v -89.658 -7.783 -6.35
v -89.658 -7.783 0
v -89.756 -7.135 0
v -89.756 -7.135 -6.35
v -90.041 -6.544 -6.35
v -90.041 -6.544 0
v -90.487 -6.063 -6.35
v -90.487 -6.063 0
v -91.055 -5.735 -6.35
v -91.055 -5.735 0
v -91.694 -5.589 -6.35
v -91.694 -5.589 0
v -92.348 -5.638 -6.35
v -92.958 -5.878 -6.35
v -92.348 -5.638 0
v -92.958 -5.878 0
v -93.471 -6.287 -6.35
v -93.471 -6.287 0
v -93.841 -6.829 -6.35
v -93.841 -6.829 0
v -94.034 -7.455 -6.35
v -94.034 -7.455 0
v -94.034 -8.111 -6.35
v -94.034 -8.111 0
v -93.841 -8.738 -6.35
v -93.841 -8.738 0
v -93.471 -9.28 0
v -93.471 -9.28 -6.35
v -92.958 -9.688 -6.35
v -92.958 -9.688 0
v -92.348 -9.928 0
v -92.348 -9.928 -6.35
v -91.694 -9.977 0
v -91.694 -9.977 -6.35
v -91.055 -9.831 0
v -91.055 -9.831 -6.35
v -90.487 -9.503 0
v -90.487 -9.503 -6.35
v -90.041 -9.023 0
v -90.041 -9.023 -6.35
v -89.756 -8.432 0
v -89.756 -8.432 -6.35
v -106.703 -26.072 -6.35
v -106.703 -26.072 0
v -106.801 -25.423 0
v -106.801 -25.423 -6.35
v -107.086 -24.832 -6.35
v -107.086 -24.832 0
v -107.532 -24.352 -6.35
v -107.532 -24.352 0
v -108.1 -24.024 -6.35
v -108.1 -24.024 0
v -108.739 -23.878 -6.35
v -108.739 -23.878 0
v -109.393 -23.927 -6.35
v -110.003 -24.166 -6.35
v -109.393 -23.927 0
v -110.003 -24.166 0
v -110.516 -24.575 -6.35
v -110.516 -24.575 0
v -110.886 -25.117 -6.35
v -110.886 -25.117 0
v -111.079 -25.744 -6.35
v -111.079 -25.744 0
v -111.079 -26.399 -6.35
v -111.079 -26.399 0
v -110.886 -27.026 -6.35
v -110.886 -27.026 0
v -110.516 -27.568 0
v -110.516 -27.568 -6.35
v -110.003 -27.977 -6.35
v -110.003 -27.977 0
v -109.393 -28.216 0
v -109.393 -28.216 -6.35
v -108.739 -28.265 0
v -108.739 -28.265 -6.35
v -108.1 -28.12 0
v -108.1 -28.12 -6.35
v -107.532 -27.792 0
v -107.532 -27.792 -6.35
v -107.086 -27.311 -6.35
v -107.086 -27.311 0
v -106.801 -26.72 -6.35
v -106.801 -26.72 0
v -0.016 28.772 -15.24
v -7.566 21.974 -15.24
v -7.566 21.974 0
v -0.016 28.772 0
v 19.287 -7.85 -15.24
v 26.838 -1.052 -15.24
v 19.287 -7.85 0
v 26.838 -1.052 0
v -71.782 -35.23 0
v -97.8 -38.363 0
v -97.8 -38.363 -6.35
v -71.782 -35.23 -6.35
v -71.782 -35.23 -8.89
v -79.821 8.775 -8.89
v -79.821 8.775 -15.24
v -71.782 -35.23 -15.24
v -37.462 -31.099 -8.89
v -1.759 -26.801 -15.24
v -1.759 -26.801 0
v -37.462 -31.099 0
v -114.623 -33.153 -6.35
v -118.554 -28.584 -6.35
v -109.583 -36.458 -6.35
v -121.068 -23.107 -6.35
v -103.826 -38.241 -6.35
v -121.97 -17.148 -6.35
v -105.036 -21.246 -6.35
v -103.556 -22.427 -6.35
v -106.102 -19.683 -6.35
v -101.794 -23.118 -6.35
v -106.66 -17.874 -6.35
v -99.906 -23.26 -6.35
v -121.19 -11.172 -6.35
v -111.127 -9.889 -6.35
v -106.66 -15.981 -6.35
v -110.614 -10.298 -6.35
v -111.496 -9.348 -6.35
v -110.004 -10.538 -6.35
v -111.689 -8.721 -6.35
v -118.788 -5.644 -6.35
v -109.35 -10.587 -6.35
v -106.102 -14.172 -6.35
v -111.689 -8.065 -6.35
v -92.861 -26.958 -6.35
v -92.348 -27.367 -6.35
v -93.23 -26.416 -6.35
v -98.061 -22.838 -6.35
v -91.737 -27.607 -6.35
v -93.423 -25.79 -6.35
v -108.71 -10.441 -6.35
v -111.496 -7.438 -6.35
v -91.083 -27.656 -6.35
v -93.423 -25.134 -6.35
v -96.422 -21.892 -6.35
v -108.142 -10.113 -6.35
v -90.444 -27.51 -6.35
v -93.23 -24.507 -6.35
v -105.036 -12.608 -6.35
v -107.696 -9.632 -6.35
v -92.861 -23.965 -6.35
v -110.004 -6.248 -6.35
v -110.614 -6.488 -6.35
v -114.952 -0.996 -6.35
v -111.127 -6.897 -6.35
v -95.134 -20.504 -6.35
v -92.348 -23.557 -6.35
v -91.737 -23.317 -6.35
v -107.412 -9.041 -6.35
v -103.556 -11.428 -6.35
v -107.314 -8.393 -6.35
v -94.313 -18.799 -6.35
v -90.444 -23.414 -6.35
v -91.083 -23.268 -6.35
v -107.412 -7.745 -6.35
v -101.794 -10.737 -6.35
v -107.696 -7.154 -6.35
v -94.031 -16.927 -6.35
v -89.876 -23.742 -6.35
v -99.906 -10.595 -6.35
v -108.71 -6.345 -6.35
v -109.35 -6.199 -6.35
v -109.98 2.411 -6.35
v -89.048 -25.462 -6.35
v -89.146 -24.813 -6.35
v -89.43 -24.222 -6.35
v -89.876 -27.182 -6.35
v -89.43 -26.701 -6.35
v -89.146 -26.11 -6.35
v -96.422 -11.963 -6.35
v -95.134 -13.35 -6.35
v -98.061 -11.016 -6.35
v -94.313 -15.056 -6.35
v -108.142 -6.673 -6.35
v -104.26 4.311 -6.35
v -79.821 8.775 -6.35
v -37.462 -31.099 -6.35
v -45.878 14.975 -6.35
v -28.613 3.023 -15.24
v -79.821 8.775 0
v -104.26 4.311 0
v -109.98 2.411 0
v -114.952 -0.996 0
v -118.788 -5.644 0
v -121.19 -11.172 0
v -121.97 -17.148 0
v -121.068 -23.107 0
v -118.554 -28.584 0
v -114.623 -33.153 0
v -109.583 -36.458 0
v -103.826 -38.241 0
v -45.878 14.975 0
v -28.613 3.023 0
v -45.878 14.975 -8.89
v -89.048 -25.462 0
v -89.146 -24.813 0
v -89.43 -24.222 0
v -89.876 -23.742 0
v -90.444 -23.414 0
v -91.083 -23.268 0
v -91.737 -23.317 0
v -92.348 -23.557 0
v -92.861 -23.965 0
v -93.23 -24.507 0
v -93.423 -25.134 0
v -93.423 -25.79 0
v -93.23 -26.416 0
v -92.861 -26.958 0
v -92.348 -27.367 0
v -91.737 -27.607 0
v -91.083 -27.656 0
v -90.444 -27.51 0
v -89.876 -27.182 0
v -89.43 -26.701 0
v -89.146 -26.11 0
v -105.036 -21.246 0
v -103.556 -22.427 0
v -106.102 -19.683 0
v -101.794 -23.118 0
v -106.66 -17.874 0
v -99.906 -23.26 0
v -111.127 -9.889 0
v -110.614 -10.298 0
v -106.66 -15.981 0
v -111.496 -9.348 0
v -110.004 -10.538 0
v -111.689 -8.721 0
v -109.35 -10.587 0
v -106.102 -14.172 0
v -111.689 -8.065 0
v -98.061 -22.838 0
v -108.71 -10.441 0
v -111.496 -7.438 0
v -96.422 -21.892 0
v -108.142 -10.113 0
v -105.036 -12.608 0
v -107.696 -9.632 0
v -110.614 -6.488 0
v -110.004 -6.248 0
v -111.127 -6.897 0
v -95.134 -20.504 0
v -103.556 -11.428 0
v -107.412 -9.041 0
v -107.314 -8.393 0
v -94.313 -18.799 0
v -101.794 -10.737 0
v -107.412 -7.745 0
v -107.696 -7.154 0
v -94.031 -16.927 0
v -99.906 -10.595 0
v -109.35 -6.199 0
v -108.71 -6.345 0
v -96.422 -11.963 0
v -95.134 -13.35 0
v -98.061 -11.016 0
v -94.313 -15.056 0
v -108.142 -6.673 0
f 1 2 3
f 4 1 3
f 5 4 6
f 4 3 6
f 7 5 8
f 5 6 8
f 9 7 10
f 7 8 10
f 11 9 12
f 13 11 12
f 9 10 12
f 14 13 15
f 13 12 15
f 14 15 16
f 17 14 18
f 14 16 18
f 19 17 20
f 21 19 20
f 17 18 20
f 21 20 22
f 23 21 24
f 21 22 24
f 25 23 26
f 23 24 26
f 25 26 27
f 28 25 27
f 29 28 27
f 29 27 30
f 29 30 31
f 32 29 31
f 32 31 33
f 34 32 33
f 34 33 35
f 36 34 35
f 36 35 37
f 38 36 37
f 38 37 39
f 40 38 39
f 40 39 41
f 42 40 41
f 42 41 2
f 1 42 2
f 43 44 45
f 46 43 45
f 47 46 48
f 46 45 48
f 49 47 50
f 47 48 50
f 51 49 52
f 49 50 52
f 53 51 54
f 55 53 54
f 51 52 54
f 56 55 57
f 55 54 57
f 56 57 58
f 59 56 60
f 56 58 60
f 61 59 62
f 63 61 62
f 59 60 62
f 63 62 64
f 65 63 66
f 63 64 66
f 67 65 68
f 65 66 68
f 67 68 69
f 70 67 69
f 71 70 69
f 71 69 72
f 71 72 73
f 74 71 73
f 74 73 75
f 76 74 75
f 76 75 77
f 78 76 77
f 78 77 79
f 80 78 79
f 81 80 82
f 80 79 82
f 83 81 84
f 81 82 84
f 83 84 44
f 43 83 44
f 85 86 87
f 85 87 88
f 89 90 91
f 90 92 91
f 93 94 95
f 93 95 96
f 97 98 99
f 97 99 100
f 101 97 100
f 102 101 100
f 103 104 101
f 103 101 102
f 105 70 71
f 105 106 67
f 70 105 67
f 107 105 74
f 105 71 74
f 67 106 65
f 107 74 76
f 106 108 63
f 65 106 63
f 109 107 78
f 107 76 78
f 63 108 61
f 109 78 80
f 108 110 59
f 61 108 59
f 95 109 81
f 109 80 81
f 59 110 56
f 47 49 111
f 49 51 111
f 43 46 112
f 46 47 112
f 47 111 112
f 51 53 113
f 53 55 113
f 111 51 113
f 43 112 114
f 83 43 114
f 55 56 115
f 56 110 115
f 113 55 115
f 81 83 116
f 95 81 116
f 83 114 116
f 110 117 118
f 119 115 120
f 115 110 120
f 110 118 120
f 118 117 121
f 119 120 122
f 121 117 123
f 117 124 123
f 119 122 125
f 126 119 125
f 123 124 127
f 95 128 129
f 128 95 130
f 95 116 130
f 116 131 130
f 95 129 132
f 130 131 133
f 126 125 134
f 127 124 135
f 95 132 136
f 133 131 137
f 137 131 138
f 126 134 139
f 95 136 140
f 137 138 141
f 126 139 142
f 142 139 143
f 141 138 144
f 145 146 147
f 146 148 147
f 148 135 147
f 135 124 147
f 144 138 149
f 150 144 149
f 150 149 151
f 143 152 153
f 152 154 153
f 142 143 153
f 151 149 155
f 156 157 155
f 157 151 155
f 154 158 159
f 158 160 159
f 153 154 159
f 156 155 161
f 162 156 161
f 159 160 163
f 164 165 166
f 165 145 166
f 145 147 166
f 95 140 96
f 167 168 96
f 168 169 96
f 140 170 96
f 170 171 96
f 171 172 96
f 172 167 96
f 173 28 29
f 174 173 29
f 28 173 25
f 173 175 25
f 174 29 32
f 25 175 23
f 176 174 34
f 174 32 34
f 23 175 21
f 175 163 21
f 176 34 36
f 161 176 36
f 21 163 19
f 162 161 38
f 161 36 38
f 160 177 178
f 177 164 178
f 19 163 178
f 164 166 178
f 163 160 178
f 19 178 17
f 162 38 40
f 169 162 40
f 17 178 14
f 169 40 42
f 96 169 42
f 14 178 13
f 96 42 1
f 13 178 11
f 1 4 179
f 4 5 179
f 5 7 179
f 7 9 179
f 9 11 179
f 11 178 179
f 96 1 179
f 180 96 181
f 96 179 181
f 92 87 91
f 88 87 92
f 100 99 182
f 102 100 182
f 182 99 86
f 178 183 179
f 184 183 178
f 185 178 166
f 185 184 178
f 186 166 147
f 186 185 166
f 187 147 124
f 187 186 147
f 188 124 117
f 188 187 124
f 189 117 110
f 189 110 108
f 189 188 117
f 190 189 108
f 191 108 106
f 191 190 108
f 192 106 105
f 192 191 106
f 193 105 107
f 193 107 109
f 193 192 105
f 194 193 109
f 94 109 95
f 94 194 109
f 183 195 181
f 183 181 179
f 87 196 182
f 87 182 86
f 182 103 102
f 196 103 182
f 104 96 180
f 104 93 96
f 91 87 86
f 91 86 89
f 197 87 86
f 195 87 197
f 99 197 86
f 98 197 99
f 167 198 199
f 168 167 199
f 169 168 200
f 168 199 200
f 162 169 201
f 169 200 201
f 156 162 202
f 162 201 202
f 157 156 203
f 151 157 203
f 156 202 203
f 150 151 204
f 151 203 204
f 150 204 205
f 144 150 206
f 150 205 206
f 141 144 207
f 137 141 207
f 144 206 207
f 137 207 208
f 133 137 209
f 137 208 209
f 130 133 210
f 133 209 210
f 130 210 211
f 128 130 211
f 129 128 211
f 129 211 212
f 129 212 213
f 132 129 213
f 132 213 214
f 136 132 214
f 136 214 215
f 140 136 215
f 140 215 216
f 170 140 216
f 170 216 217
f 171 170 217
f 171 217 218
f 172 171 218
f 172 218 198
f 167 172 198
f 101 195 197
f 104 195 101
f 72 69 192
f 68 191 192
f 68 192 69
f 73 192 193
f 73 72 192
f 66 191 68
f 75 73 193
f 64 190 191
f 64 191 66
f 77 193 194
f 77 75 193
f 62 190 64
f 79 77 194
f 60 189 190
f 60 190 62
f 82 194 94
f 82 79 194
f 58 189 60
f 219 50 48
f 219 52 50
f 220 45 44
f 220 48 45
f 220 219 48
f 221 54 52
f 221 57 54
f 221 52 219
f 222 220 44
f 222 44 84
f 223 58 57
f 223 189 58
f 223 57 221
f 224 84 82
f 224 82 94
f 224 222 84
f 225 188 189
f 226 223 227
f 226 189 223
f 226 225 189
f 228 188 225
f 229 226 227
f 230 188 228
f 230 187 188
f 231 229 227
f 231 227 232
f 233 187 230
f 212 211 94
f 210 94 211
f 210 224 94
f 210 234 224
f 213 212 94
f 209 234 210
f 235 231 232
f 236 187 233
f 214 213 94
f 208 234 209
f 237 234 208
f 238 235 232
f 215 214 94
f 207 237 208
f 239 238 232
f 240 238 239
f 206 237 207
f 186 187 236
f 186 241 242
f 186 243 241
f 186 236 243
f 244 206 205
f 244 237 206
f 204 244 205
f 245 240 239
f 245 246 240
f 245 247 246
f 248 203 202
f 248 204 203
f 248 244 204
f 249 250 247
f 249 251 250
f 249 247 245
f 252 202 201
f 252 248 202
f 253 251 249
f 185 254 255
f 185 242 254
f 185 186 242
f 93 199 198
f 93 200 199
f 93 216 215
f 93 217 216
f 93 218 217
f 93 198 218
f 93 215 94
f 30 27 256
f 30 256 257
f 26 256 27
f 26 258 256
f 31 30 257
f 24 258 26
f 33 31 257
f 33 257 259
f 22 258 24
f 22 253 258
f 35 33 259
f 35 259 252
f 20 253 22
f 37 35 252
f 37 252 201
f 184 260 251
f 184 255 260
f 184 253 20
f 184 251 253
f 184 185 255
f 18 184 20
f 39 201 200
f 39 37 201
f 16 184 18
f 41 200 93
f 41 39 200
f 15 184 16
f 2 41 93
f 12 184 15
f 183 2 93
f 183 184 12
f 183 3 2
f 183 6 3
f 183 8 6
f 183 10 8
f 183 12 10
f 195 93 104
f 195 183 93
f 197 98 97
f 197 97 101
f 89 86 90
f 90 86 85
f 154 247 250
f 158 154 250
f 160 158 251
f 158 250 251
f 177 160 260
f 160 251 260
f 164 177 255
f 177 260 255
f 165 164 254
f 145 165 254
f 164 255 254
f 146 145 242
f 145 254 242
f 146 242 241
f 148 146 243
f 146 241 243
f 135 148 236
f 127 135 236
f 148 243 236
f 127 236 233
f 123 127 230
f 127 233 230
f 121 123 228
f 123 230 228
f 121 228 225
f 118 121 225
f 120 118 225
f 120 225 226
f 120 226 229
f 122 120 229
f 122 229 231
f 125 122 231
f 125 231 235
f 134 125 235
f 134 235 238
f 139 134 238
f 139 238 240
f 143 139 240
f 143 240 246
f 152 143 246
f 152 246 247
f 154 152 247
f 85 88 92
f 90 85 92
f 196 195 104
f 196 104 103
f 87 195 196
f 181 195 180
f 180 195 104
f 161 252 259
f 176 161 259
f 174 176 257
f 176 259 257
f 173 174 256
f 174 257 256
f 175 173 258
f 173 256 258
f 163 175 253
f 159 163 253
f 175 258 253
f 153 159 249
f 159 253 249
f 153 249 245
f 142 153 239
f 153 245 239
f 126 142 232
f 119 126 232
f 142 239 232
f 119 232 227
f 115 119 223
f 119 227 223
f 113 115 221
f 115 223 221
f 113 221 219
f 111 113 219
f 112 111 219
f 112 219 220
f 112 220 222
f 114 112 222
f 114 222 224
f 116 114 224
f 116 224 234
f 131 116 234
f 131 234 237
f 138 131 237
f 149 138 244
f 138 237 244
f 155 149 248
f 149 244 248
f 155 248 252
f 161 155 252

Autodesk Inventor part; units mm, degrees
ref_plane "Back Plane" through (0, 0, -12.7) normal (0, 0, -1) x (-1, 0, 0)
ref_plane "Midplane" through (0, 0, -6.35) normal (0, 0, 1) x (1, 0, 0)
ref_plane "YZ Plane" through (0, 0, 0) normal (1, 0, 0) x (0, 1, 0)
sketch "the Axle" plane through (0, 0, 0) normal (0, 0, 1) x (1, 0, 0)
  line L0 (-30.4731, 63.7704) -> (-43.9693, 51.6183)
  line L1 (-43.9693, 51.6183) -> (-54.1341, 62.9075)
  line L2 (-40.6378, 75.0595) -> (-30.4731, 63.7704)
  line L3 (-30.4731, 63.7704) -> (-12.3121, 63.7704) construction
  arc A0 (-40.6378, 75.0595) -> (-54.1341, 62.9075) centre (-42.9621, 64.0703) ccw
  line L4 (-54.1341, 62.9075) -> (-40.6378, 75.0595) construction
  point P0 (-12.6671, 65.6222)
  dimension "d84" = 18.161
  dimension "d85" = 138
  dimension "d231" = 19.812
sketch "Motor Mount Pattern" plane through (0, 0, 0) normal (0, 0, 1) x (1, 0, 0)
  line L0 (-116.3697, 51.2894) -> (-116.3697, 68.9671) construction
  line L1 (-116.3697, 68.9671) -> (-134.0474, 68.9671) construction
  line L2 (-134.0474, 68.9671) -> (-134.0474, 51.2894) construction
  line L3 (-134.0474, 51.2894) -> (-116.3697, 68.9671) construction
  line L4 (-116.3697, 51.2894) -> (-134.0474, 68.9671) construction
  line L5 (-134.0474, 51.2894) -> (-134.0474, 68.9671) construction
  line L6 (-134.0474, 51.2894) -> (-116.3697, 68.9671) construction
  line L7 (-134.0474, 51.2894) -> (-125.2086, 60.1282) construction
  line L8 (-116.3697, 51.2894) -> (-134.0474, 51.2894) construction
  circle A0 centre (-125.2086, 60.1282) radius 6.2
  circle A1 centre (-116.3697, 68.9671) radius 2.25
  circle A2 centre (-134.0474, 68.9671) radius 2.25
  circle A3 centre (-116.3697, 51.2894) radius 2.25
  circle A4 centre (-134.0474, 51.2894) radius 2.25
  circle A5 centre (-116.3697, 68.9671) radius 4.5 construction
  circle A6 centre (-134.0474, 68.9671) radius 4.5 construction
  circle A7 centre (-134.0474, 51.2894) radius 4.5 construction
  circle A8 centre (-116.3697, 51.2894) radius 4.5 construction
  point P0 (-121.7102, 57.8126)
  dimension "d189" = 25
  dimension "d192" = 12.4
  dimension "d193" = 4.5
  dimension "d195" = 9
sketch "Motor Body Extent" plane through (0, 0, 0) normal (0, 0, 1) x (1, 0, 0)
  circle A0 centre (-176.4641, 62.233) radius 24.5 construction
  dimension "MotorDia" = 49
sketch "Block7" plane through (0, 0, 0) normal (0, 0, 1) x (1, 0, 0)
  line L0 (-114.6206, 39.8537) -> (-104.0422, 54.0169) construction
  line L1 (-104.0422, 54.0169) -> (-118.2054, 64.5953) construction
  line L2 (-118.2054, 64.5953) -> (-128.7838, 50.432) construction
  line L3 (-128.7838, 50.432) -> (-104.0422, 54.0169) construction
  line L4 (-114.6206, 39.8537) -> (-118.2054, 64.5953) construction
  line L5 (-128.7838, 50.432) -> (-118.2054, 64.5953) construction
  line L6 (-128.7838, 50.432) -> (-104.0422, 54.0169) construction
  line L7 (-128.7838, 50.432) -> (-116.413, 52.2245) construction
  line L8 (-114.6206, 39.8537) -> (-128.7838, 50.432) construction
  circle A0 centre (-116.413, 52.2245) radius 6.2
  circle A1 centre (-104.0422, 54.0169) radius 2.25
  circle A2 centre (-118.2054, 64.5953) radius 2.25
  circle A3 centre (-114.6206, 39.8537) radius 2.25
  circle A4 centre (-128.7838, 50.432) radius 2.25
  circle A5 centre (-104.0422, 54.0169) radius 4.5 construction
  circle A6 centre (-118.2054, 64.5953) radius 4.5 construction
  circle A7 centre (-128.7838, 50.432) radius 4.5 construction
  circle A8 centre (-114.6206, 39.8537) radius 4.5 construction
  line L9 (-107.5171, 56.2696) -> (-121.6653, 66.8681) construction
  line L10 (-121.6653, 66.8681) -> (-132.2638, 52.7199) construction
  line L11 (-132.2638, 52.7199) -> (-118.1156, 42.1214) construction
  line L12 (-118.1156, 42.1214) -> (-121.6653, 66.8681) construction
  line L13 (-107.5171, 56.2696) -> (-132.2638, 52.7199) construction
  line L14 (-118.1156, 42.1214) -> (-132.2638, 52.7199) construction
  line L15 (-118.1156, 42.1214) -> (-121.6653, 66.8681) construction
  line L16 (-118.1156, 42.1214) -> (-119.8904, 54.4948) construction
  line L17 (-107.5171, 56.2696) -> (-118.1156, 42.1214) construction
  circle A9 centre (-119.8904, 54.4948) radius 6.2
  circle A10 centre (-121.6653, 66.8681) radius 2.25
  circle A11 centre (-132.2638, 52.7199) radius 2.25
  circle A12 centre (-107.5171, 56.2696) radius 2.25
  circle A13 centre (-118.1156, 42.1214) radius 2.25
  circle A14 centre (-121.6653, 66.8681) radius 4.5 construction
  circle A15 centre (-132.2638, 52.7199) radius 4.5 construction
  circle A16 centre (-118.1156, 42.1214) radius 4.5 construction
  circle A17 centre (-107.5171, 56.2696) radius 4.5 construction
  line L18 (-105.811, 55.3186) -> (-120.0113, 65.8472) construction
  line L19 (-120.0113, 65.8472) -> (-130.5399, 51.6469) construction
  line L20 (-130.5399, 51.6469) -> (-116.3396, 41.1183) construction
  line L21 (-116.3396, 41.1183) -> (-120.0113, 65.8472) construction
  line L22 (-105.811, 55.3186) -> (-130.5399, 51.6469) construction
  line L23 (-116.3396, 41.1183) -> (-130.5399, 51.6469) construction
  line L24 (-116.3396, 41.1183) -> (-120.0113, 65.8472) construction
  line L25 (-116.3396, 41.1183) -> (-118.1755, 53.4828) construction
  line L26 (-105.811, 55.3186) -> (-116.3396, 41.1183) construction
  circle A18 centre (-118.1755, 53.4828) radius 6.2
  circle A19 centre (-120.0113, 65.8472) radius 2.25
  circle A20 centre (-130.5399, 51.6469) radius 2.25
  circle A21 centre (-105.811, 55.3186) radius 2.25
  circle A22 centre (-116.3396, 41.1183) radius 2.25
  circle A23 centre (-120.0113, 65.8472) radius 4.5 construction
  circle A24 centre (-130.5399, 51.6469) radius 4.5 construction
  circle A25 centre (-116.3396, 41.1183) radius 4.5 construction
  circle A26 centre (-105.811, 55.3186) radius 4.5 construction
  point P0 (-115.0557, 53.032)
sketch "MotorMountPattern" plane through (0, 0, 0) normal (0, 0, 1) x (1, 0, 0)
  line L0 (-95.4079, 16.8905) -> (-77.7418, 16.8905) construction
  line L1 (-77.7418, 16.8905) -> (-77.7418, 34.5797) construction
  line L2 (-77.7418, 34.5797) -> (-95.4079, 34.5797) construction
  line L3 (-95.4079, 34.5797) -> (-95.4079, 16.8905) construction
  line L4 (-95.4079, 16.8905) -> (-77.7418, 34.5797) construction
  line L5 (-77.7418, 16.8905) -> (-95.4079, 34.5797) construction
  circle A0 centre (-95.4079, 34.5797) radius 2.2
  circle A1 centre (-77.7418, 34.5797) radius 2.2
  circle A2 centre (-77.7418, 16.8905) radius 2.2
  circle A3 centre (-95.4079, 16.8905) radius 2.2
  circle A4 centre (-86.5749, 25.7351) radius 6.35
  point P0 (-86.5749, 25.7351)
  dimension "d197" = 25
  dimension "M4Clearance" = 4.4
  dimension "MotorShaftClearance" = 12.7
sketch "Base Sketch" plane through (0, 0, 0) normal (0, 0, 1) x (1, 0, 0)
  line L0 (26.8378, -1.0519) -> (-1.7592, -26.8007)
  line L1 (-1.7592, -26.8007) -> (-28.6127, 3.0232)
  line L2 (-28.6127, 3.0232) -> (-0.0158, 28.772)
  line L3 (-0.0158, 28.772) -> (26.8378, -1.0519)
  line L4 (-7.5661, 21.9736) -> (19.2874, -7.8503)
  circle A0 centre (0, 0) radius 41.5 construction
  line L5 (-7.5661, 21.9736) -> (-79.8206, 8.7754)
  line L6 (-97.8004, -38.3626) -> (-71.7823, -35.2304)
  circle A1 centre (-100.3809, -16.9274) radius 21.59
  line L7 (-148.6125, -66.8274) -> (67.2297, -66.8274) construction
  circle A2 centre (-100.3809, -16.9274) radius 24.5 construction
  line L8 (-71.1528, -2.3995) -> (-75.5515, 3.8227)
  line L9 (-65.5155, -27.1154) -> (-69.9143, -20.8933)
  line L10 (-49.848, 2.3791) -> (-54.2467, 8.6013)
  line L11 (-45.6742, -26.5785) -> (-50.073, -20.3564)
  circle A3 centre (-65.5155, -27.1154) radius 2.5527 construction
  line L12 (-45.8783, 14.9754) -> (-37.4622, -31.0988)
  line L13 (-79.8206, 8.7754) -> (-71.7823, -35.2304)
  line L14 (-79.8206, 8.7754) -> (-104.2604, 4.3112)
  line L15 (-71.7823, -35.2304) -> (-1.7592, -26.8007)
  line L16 (12.489, -0.2999) -> (-1.0072, -12.452)
  line L17 (-1.0072, -12.452) -> (-11.172, -1.1629)
  line L18 (2.3243, 10.9892) -> (12.489, -0.2999)
  line L19 (12.489, -0.2999) -> (30.65, -0.2999) construction
  arc A4 (2.3243, 10.9892) -> (-11.172, -1.1629) centre (0, 0) ccw
  line L20 (-11.172, -1.1629) -> (2.3243, 10.9892) construction
  line L21 (-108.9034, -26.0716) -> (-91.2478, -25.4618) construction
  line L22 (-91.2478, -25.4618) -> (-91.8584, -7.7832) construction
  line L23 (-91.8584, -7.7832) -> (-109.514, -8.393) construction
  line L24 (-109.514, -8.393) -> (-108.9034, -26.0716) construction
  line L25 (-108.9034, -26.0716) -> (-91.8584, -7.7832) construction
  line L26 (-91.2478, -25.4618) -> (-109.514, -8.393) construction
  circle A5 centre (-109.514, -8.393) radius 2.2
  circle A6 centre (-91.8584, -7.7832) radius 2.2
  circle A7 centre (-91.2478, -25.4618) radius 2.2
  circle A8 centre (-108.9034, -26.0716) radius 2.2
  circle A9 centre (-100.3809, -16.9274) radius 6.35
  dimension "AxleMargin" = 10.16
  dimension "d97" = 10.16
  dimension "d98" = 10.16
  dimension "d99" = 10.16
  dimension "WheelDia" = 83
  dimension "d157" = 43.18
  dimension "AxleBoardClearance" = 66.8274
  dimension "d233" = 49
  dimension "BoardClearance" = 25.4
  dimension "NomCtrDistance" = 101.7981
  dimension "d258" = 7.62
  dimension "N10Clearance" = 5.1054
  dimension "M4ClearanceDia" = 4.5
  dimension "d211" = 10.8
  dimension "d218" = 9
extrude "Base" add sketch "Base Sketch" against normal blind 15.24 contours L0 L4 L2 L3 | L15 L12 L5 L2 L1 | L15 L13 L5 L12
extrude "Extrusion7" cut sketch "Base Sketch" against normal blind 8.89 contours L15 L13 L5 L12
extrude "Extrusion8" add sketch "Base Sketch" against normal blind 6.35 separate body contours L15 L13 L5 L12 | L6 A1 L14 L13 | A1
sketch "Sketch12" plane through (0, 0, -12.7) normal (0, 0, -1) x (-1, 0, 0)
  line L0 (7.5661, 21.9736) -> (105.9285, 5.8665) projected
  line L1 (100.2333, -36.9167) -> (1.7592, -26.8007) projected
  line L2 (16.1, -21.8905) -> (20.7942, 13.3729)
  line L3 (75.7186, -28.0149) -> (16.1, -21.8905)
  line L4 (20.7942, 13.3729) -> (82.4161, 3.2822)
  line L5 (100.3809, -16.9274) -> (104.4983, -13.952) construction
  line L6 (114.7308, -36.7851) -> (118.8483, -33.8097) construction
  line L7 (90.1484, 5.9057) -> (86.0309, 2.9303) construction
  arc A0 (86.0309, 2.9303) -> (114.7308, -36.7851) centre (100.3809, -16.9274) ccw construction
  arc A1 (118.8483, -33.8097) -> (90.1484, 5.9057) centre (104.4983, -13.952) ccw construction
  line L8 (116.2185, -38.8438) -> (120.336, -35.8684)
  arc A2 (120.336, -35.8684) -> (88.6607, 7.9645) centre (104.4983, -13.952) ccw
  line L9 (88.6607, 7.9645) -> (84.5432, 4.989)
  arc A3 (84.5432, 4.989) -> (82.4161, 3.2822) centre (100.3809, -16.9274) ccw
  arc A4 (75.7186, -28.0149) -> (116.2185, -38.8438) centre (100.3809, -16.9274) ccw
  arc A5 (82.4161, 3.2822) -> (75.7186, -28.0149) centre (100.3809, -16.9274) ccw
  arc A6 (74.798, 4.5297) -> (68.6388, -27.2876) centre (100.3809, -16.9274) ccw
  point P0 (0, 0)
  point P1 (11.172, -1.1629)
  point P2 (102.4396, -15.4397)
  dimension "d178" = 7.62
  dimension "d183" = 6.35
  dimension "d186" = 88.283
  dimension "d187" = 88.283
  dimension "d226" = 6.35
  dimension "d228" = 49
  dimension "d229" = 2.54
  dimension "d251" = 6.35
  dimension "d252" = 2.54
  dimension "d235" = 7.62
  dimension "d236" = 7.62
properties part number "MountSketch"
